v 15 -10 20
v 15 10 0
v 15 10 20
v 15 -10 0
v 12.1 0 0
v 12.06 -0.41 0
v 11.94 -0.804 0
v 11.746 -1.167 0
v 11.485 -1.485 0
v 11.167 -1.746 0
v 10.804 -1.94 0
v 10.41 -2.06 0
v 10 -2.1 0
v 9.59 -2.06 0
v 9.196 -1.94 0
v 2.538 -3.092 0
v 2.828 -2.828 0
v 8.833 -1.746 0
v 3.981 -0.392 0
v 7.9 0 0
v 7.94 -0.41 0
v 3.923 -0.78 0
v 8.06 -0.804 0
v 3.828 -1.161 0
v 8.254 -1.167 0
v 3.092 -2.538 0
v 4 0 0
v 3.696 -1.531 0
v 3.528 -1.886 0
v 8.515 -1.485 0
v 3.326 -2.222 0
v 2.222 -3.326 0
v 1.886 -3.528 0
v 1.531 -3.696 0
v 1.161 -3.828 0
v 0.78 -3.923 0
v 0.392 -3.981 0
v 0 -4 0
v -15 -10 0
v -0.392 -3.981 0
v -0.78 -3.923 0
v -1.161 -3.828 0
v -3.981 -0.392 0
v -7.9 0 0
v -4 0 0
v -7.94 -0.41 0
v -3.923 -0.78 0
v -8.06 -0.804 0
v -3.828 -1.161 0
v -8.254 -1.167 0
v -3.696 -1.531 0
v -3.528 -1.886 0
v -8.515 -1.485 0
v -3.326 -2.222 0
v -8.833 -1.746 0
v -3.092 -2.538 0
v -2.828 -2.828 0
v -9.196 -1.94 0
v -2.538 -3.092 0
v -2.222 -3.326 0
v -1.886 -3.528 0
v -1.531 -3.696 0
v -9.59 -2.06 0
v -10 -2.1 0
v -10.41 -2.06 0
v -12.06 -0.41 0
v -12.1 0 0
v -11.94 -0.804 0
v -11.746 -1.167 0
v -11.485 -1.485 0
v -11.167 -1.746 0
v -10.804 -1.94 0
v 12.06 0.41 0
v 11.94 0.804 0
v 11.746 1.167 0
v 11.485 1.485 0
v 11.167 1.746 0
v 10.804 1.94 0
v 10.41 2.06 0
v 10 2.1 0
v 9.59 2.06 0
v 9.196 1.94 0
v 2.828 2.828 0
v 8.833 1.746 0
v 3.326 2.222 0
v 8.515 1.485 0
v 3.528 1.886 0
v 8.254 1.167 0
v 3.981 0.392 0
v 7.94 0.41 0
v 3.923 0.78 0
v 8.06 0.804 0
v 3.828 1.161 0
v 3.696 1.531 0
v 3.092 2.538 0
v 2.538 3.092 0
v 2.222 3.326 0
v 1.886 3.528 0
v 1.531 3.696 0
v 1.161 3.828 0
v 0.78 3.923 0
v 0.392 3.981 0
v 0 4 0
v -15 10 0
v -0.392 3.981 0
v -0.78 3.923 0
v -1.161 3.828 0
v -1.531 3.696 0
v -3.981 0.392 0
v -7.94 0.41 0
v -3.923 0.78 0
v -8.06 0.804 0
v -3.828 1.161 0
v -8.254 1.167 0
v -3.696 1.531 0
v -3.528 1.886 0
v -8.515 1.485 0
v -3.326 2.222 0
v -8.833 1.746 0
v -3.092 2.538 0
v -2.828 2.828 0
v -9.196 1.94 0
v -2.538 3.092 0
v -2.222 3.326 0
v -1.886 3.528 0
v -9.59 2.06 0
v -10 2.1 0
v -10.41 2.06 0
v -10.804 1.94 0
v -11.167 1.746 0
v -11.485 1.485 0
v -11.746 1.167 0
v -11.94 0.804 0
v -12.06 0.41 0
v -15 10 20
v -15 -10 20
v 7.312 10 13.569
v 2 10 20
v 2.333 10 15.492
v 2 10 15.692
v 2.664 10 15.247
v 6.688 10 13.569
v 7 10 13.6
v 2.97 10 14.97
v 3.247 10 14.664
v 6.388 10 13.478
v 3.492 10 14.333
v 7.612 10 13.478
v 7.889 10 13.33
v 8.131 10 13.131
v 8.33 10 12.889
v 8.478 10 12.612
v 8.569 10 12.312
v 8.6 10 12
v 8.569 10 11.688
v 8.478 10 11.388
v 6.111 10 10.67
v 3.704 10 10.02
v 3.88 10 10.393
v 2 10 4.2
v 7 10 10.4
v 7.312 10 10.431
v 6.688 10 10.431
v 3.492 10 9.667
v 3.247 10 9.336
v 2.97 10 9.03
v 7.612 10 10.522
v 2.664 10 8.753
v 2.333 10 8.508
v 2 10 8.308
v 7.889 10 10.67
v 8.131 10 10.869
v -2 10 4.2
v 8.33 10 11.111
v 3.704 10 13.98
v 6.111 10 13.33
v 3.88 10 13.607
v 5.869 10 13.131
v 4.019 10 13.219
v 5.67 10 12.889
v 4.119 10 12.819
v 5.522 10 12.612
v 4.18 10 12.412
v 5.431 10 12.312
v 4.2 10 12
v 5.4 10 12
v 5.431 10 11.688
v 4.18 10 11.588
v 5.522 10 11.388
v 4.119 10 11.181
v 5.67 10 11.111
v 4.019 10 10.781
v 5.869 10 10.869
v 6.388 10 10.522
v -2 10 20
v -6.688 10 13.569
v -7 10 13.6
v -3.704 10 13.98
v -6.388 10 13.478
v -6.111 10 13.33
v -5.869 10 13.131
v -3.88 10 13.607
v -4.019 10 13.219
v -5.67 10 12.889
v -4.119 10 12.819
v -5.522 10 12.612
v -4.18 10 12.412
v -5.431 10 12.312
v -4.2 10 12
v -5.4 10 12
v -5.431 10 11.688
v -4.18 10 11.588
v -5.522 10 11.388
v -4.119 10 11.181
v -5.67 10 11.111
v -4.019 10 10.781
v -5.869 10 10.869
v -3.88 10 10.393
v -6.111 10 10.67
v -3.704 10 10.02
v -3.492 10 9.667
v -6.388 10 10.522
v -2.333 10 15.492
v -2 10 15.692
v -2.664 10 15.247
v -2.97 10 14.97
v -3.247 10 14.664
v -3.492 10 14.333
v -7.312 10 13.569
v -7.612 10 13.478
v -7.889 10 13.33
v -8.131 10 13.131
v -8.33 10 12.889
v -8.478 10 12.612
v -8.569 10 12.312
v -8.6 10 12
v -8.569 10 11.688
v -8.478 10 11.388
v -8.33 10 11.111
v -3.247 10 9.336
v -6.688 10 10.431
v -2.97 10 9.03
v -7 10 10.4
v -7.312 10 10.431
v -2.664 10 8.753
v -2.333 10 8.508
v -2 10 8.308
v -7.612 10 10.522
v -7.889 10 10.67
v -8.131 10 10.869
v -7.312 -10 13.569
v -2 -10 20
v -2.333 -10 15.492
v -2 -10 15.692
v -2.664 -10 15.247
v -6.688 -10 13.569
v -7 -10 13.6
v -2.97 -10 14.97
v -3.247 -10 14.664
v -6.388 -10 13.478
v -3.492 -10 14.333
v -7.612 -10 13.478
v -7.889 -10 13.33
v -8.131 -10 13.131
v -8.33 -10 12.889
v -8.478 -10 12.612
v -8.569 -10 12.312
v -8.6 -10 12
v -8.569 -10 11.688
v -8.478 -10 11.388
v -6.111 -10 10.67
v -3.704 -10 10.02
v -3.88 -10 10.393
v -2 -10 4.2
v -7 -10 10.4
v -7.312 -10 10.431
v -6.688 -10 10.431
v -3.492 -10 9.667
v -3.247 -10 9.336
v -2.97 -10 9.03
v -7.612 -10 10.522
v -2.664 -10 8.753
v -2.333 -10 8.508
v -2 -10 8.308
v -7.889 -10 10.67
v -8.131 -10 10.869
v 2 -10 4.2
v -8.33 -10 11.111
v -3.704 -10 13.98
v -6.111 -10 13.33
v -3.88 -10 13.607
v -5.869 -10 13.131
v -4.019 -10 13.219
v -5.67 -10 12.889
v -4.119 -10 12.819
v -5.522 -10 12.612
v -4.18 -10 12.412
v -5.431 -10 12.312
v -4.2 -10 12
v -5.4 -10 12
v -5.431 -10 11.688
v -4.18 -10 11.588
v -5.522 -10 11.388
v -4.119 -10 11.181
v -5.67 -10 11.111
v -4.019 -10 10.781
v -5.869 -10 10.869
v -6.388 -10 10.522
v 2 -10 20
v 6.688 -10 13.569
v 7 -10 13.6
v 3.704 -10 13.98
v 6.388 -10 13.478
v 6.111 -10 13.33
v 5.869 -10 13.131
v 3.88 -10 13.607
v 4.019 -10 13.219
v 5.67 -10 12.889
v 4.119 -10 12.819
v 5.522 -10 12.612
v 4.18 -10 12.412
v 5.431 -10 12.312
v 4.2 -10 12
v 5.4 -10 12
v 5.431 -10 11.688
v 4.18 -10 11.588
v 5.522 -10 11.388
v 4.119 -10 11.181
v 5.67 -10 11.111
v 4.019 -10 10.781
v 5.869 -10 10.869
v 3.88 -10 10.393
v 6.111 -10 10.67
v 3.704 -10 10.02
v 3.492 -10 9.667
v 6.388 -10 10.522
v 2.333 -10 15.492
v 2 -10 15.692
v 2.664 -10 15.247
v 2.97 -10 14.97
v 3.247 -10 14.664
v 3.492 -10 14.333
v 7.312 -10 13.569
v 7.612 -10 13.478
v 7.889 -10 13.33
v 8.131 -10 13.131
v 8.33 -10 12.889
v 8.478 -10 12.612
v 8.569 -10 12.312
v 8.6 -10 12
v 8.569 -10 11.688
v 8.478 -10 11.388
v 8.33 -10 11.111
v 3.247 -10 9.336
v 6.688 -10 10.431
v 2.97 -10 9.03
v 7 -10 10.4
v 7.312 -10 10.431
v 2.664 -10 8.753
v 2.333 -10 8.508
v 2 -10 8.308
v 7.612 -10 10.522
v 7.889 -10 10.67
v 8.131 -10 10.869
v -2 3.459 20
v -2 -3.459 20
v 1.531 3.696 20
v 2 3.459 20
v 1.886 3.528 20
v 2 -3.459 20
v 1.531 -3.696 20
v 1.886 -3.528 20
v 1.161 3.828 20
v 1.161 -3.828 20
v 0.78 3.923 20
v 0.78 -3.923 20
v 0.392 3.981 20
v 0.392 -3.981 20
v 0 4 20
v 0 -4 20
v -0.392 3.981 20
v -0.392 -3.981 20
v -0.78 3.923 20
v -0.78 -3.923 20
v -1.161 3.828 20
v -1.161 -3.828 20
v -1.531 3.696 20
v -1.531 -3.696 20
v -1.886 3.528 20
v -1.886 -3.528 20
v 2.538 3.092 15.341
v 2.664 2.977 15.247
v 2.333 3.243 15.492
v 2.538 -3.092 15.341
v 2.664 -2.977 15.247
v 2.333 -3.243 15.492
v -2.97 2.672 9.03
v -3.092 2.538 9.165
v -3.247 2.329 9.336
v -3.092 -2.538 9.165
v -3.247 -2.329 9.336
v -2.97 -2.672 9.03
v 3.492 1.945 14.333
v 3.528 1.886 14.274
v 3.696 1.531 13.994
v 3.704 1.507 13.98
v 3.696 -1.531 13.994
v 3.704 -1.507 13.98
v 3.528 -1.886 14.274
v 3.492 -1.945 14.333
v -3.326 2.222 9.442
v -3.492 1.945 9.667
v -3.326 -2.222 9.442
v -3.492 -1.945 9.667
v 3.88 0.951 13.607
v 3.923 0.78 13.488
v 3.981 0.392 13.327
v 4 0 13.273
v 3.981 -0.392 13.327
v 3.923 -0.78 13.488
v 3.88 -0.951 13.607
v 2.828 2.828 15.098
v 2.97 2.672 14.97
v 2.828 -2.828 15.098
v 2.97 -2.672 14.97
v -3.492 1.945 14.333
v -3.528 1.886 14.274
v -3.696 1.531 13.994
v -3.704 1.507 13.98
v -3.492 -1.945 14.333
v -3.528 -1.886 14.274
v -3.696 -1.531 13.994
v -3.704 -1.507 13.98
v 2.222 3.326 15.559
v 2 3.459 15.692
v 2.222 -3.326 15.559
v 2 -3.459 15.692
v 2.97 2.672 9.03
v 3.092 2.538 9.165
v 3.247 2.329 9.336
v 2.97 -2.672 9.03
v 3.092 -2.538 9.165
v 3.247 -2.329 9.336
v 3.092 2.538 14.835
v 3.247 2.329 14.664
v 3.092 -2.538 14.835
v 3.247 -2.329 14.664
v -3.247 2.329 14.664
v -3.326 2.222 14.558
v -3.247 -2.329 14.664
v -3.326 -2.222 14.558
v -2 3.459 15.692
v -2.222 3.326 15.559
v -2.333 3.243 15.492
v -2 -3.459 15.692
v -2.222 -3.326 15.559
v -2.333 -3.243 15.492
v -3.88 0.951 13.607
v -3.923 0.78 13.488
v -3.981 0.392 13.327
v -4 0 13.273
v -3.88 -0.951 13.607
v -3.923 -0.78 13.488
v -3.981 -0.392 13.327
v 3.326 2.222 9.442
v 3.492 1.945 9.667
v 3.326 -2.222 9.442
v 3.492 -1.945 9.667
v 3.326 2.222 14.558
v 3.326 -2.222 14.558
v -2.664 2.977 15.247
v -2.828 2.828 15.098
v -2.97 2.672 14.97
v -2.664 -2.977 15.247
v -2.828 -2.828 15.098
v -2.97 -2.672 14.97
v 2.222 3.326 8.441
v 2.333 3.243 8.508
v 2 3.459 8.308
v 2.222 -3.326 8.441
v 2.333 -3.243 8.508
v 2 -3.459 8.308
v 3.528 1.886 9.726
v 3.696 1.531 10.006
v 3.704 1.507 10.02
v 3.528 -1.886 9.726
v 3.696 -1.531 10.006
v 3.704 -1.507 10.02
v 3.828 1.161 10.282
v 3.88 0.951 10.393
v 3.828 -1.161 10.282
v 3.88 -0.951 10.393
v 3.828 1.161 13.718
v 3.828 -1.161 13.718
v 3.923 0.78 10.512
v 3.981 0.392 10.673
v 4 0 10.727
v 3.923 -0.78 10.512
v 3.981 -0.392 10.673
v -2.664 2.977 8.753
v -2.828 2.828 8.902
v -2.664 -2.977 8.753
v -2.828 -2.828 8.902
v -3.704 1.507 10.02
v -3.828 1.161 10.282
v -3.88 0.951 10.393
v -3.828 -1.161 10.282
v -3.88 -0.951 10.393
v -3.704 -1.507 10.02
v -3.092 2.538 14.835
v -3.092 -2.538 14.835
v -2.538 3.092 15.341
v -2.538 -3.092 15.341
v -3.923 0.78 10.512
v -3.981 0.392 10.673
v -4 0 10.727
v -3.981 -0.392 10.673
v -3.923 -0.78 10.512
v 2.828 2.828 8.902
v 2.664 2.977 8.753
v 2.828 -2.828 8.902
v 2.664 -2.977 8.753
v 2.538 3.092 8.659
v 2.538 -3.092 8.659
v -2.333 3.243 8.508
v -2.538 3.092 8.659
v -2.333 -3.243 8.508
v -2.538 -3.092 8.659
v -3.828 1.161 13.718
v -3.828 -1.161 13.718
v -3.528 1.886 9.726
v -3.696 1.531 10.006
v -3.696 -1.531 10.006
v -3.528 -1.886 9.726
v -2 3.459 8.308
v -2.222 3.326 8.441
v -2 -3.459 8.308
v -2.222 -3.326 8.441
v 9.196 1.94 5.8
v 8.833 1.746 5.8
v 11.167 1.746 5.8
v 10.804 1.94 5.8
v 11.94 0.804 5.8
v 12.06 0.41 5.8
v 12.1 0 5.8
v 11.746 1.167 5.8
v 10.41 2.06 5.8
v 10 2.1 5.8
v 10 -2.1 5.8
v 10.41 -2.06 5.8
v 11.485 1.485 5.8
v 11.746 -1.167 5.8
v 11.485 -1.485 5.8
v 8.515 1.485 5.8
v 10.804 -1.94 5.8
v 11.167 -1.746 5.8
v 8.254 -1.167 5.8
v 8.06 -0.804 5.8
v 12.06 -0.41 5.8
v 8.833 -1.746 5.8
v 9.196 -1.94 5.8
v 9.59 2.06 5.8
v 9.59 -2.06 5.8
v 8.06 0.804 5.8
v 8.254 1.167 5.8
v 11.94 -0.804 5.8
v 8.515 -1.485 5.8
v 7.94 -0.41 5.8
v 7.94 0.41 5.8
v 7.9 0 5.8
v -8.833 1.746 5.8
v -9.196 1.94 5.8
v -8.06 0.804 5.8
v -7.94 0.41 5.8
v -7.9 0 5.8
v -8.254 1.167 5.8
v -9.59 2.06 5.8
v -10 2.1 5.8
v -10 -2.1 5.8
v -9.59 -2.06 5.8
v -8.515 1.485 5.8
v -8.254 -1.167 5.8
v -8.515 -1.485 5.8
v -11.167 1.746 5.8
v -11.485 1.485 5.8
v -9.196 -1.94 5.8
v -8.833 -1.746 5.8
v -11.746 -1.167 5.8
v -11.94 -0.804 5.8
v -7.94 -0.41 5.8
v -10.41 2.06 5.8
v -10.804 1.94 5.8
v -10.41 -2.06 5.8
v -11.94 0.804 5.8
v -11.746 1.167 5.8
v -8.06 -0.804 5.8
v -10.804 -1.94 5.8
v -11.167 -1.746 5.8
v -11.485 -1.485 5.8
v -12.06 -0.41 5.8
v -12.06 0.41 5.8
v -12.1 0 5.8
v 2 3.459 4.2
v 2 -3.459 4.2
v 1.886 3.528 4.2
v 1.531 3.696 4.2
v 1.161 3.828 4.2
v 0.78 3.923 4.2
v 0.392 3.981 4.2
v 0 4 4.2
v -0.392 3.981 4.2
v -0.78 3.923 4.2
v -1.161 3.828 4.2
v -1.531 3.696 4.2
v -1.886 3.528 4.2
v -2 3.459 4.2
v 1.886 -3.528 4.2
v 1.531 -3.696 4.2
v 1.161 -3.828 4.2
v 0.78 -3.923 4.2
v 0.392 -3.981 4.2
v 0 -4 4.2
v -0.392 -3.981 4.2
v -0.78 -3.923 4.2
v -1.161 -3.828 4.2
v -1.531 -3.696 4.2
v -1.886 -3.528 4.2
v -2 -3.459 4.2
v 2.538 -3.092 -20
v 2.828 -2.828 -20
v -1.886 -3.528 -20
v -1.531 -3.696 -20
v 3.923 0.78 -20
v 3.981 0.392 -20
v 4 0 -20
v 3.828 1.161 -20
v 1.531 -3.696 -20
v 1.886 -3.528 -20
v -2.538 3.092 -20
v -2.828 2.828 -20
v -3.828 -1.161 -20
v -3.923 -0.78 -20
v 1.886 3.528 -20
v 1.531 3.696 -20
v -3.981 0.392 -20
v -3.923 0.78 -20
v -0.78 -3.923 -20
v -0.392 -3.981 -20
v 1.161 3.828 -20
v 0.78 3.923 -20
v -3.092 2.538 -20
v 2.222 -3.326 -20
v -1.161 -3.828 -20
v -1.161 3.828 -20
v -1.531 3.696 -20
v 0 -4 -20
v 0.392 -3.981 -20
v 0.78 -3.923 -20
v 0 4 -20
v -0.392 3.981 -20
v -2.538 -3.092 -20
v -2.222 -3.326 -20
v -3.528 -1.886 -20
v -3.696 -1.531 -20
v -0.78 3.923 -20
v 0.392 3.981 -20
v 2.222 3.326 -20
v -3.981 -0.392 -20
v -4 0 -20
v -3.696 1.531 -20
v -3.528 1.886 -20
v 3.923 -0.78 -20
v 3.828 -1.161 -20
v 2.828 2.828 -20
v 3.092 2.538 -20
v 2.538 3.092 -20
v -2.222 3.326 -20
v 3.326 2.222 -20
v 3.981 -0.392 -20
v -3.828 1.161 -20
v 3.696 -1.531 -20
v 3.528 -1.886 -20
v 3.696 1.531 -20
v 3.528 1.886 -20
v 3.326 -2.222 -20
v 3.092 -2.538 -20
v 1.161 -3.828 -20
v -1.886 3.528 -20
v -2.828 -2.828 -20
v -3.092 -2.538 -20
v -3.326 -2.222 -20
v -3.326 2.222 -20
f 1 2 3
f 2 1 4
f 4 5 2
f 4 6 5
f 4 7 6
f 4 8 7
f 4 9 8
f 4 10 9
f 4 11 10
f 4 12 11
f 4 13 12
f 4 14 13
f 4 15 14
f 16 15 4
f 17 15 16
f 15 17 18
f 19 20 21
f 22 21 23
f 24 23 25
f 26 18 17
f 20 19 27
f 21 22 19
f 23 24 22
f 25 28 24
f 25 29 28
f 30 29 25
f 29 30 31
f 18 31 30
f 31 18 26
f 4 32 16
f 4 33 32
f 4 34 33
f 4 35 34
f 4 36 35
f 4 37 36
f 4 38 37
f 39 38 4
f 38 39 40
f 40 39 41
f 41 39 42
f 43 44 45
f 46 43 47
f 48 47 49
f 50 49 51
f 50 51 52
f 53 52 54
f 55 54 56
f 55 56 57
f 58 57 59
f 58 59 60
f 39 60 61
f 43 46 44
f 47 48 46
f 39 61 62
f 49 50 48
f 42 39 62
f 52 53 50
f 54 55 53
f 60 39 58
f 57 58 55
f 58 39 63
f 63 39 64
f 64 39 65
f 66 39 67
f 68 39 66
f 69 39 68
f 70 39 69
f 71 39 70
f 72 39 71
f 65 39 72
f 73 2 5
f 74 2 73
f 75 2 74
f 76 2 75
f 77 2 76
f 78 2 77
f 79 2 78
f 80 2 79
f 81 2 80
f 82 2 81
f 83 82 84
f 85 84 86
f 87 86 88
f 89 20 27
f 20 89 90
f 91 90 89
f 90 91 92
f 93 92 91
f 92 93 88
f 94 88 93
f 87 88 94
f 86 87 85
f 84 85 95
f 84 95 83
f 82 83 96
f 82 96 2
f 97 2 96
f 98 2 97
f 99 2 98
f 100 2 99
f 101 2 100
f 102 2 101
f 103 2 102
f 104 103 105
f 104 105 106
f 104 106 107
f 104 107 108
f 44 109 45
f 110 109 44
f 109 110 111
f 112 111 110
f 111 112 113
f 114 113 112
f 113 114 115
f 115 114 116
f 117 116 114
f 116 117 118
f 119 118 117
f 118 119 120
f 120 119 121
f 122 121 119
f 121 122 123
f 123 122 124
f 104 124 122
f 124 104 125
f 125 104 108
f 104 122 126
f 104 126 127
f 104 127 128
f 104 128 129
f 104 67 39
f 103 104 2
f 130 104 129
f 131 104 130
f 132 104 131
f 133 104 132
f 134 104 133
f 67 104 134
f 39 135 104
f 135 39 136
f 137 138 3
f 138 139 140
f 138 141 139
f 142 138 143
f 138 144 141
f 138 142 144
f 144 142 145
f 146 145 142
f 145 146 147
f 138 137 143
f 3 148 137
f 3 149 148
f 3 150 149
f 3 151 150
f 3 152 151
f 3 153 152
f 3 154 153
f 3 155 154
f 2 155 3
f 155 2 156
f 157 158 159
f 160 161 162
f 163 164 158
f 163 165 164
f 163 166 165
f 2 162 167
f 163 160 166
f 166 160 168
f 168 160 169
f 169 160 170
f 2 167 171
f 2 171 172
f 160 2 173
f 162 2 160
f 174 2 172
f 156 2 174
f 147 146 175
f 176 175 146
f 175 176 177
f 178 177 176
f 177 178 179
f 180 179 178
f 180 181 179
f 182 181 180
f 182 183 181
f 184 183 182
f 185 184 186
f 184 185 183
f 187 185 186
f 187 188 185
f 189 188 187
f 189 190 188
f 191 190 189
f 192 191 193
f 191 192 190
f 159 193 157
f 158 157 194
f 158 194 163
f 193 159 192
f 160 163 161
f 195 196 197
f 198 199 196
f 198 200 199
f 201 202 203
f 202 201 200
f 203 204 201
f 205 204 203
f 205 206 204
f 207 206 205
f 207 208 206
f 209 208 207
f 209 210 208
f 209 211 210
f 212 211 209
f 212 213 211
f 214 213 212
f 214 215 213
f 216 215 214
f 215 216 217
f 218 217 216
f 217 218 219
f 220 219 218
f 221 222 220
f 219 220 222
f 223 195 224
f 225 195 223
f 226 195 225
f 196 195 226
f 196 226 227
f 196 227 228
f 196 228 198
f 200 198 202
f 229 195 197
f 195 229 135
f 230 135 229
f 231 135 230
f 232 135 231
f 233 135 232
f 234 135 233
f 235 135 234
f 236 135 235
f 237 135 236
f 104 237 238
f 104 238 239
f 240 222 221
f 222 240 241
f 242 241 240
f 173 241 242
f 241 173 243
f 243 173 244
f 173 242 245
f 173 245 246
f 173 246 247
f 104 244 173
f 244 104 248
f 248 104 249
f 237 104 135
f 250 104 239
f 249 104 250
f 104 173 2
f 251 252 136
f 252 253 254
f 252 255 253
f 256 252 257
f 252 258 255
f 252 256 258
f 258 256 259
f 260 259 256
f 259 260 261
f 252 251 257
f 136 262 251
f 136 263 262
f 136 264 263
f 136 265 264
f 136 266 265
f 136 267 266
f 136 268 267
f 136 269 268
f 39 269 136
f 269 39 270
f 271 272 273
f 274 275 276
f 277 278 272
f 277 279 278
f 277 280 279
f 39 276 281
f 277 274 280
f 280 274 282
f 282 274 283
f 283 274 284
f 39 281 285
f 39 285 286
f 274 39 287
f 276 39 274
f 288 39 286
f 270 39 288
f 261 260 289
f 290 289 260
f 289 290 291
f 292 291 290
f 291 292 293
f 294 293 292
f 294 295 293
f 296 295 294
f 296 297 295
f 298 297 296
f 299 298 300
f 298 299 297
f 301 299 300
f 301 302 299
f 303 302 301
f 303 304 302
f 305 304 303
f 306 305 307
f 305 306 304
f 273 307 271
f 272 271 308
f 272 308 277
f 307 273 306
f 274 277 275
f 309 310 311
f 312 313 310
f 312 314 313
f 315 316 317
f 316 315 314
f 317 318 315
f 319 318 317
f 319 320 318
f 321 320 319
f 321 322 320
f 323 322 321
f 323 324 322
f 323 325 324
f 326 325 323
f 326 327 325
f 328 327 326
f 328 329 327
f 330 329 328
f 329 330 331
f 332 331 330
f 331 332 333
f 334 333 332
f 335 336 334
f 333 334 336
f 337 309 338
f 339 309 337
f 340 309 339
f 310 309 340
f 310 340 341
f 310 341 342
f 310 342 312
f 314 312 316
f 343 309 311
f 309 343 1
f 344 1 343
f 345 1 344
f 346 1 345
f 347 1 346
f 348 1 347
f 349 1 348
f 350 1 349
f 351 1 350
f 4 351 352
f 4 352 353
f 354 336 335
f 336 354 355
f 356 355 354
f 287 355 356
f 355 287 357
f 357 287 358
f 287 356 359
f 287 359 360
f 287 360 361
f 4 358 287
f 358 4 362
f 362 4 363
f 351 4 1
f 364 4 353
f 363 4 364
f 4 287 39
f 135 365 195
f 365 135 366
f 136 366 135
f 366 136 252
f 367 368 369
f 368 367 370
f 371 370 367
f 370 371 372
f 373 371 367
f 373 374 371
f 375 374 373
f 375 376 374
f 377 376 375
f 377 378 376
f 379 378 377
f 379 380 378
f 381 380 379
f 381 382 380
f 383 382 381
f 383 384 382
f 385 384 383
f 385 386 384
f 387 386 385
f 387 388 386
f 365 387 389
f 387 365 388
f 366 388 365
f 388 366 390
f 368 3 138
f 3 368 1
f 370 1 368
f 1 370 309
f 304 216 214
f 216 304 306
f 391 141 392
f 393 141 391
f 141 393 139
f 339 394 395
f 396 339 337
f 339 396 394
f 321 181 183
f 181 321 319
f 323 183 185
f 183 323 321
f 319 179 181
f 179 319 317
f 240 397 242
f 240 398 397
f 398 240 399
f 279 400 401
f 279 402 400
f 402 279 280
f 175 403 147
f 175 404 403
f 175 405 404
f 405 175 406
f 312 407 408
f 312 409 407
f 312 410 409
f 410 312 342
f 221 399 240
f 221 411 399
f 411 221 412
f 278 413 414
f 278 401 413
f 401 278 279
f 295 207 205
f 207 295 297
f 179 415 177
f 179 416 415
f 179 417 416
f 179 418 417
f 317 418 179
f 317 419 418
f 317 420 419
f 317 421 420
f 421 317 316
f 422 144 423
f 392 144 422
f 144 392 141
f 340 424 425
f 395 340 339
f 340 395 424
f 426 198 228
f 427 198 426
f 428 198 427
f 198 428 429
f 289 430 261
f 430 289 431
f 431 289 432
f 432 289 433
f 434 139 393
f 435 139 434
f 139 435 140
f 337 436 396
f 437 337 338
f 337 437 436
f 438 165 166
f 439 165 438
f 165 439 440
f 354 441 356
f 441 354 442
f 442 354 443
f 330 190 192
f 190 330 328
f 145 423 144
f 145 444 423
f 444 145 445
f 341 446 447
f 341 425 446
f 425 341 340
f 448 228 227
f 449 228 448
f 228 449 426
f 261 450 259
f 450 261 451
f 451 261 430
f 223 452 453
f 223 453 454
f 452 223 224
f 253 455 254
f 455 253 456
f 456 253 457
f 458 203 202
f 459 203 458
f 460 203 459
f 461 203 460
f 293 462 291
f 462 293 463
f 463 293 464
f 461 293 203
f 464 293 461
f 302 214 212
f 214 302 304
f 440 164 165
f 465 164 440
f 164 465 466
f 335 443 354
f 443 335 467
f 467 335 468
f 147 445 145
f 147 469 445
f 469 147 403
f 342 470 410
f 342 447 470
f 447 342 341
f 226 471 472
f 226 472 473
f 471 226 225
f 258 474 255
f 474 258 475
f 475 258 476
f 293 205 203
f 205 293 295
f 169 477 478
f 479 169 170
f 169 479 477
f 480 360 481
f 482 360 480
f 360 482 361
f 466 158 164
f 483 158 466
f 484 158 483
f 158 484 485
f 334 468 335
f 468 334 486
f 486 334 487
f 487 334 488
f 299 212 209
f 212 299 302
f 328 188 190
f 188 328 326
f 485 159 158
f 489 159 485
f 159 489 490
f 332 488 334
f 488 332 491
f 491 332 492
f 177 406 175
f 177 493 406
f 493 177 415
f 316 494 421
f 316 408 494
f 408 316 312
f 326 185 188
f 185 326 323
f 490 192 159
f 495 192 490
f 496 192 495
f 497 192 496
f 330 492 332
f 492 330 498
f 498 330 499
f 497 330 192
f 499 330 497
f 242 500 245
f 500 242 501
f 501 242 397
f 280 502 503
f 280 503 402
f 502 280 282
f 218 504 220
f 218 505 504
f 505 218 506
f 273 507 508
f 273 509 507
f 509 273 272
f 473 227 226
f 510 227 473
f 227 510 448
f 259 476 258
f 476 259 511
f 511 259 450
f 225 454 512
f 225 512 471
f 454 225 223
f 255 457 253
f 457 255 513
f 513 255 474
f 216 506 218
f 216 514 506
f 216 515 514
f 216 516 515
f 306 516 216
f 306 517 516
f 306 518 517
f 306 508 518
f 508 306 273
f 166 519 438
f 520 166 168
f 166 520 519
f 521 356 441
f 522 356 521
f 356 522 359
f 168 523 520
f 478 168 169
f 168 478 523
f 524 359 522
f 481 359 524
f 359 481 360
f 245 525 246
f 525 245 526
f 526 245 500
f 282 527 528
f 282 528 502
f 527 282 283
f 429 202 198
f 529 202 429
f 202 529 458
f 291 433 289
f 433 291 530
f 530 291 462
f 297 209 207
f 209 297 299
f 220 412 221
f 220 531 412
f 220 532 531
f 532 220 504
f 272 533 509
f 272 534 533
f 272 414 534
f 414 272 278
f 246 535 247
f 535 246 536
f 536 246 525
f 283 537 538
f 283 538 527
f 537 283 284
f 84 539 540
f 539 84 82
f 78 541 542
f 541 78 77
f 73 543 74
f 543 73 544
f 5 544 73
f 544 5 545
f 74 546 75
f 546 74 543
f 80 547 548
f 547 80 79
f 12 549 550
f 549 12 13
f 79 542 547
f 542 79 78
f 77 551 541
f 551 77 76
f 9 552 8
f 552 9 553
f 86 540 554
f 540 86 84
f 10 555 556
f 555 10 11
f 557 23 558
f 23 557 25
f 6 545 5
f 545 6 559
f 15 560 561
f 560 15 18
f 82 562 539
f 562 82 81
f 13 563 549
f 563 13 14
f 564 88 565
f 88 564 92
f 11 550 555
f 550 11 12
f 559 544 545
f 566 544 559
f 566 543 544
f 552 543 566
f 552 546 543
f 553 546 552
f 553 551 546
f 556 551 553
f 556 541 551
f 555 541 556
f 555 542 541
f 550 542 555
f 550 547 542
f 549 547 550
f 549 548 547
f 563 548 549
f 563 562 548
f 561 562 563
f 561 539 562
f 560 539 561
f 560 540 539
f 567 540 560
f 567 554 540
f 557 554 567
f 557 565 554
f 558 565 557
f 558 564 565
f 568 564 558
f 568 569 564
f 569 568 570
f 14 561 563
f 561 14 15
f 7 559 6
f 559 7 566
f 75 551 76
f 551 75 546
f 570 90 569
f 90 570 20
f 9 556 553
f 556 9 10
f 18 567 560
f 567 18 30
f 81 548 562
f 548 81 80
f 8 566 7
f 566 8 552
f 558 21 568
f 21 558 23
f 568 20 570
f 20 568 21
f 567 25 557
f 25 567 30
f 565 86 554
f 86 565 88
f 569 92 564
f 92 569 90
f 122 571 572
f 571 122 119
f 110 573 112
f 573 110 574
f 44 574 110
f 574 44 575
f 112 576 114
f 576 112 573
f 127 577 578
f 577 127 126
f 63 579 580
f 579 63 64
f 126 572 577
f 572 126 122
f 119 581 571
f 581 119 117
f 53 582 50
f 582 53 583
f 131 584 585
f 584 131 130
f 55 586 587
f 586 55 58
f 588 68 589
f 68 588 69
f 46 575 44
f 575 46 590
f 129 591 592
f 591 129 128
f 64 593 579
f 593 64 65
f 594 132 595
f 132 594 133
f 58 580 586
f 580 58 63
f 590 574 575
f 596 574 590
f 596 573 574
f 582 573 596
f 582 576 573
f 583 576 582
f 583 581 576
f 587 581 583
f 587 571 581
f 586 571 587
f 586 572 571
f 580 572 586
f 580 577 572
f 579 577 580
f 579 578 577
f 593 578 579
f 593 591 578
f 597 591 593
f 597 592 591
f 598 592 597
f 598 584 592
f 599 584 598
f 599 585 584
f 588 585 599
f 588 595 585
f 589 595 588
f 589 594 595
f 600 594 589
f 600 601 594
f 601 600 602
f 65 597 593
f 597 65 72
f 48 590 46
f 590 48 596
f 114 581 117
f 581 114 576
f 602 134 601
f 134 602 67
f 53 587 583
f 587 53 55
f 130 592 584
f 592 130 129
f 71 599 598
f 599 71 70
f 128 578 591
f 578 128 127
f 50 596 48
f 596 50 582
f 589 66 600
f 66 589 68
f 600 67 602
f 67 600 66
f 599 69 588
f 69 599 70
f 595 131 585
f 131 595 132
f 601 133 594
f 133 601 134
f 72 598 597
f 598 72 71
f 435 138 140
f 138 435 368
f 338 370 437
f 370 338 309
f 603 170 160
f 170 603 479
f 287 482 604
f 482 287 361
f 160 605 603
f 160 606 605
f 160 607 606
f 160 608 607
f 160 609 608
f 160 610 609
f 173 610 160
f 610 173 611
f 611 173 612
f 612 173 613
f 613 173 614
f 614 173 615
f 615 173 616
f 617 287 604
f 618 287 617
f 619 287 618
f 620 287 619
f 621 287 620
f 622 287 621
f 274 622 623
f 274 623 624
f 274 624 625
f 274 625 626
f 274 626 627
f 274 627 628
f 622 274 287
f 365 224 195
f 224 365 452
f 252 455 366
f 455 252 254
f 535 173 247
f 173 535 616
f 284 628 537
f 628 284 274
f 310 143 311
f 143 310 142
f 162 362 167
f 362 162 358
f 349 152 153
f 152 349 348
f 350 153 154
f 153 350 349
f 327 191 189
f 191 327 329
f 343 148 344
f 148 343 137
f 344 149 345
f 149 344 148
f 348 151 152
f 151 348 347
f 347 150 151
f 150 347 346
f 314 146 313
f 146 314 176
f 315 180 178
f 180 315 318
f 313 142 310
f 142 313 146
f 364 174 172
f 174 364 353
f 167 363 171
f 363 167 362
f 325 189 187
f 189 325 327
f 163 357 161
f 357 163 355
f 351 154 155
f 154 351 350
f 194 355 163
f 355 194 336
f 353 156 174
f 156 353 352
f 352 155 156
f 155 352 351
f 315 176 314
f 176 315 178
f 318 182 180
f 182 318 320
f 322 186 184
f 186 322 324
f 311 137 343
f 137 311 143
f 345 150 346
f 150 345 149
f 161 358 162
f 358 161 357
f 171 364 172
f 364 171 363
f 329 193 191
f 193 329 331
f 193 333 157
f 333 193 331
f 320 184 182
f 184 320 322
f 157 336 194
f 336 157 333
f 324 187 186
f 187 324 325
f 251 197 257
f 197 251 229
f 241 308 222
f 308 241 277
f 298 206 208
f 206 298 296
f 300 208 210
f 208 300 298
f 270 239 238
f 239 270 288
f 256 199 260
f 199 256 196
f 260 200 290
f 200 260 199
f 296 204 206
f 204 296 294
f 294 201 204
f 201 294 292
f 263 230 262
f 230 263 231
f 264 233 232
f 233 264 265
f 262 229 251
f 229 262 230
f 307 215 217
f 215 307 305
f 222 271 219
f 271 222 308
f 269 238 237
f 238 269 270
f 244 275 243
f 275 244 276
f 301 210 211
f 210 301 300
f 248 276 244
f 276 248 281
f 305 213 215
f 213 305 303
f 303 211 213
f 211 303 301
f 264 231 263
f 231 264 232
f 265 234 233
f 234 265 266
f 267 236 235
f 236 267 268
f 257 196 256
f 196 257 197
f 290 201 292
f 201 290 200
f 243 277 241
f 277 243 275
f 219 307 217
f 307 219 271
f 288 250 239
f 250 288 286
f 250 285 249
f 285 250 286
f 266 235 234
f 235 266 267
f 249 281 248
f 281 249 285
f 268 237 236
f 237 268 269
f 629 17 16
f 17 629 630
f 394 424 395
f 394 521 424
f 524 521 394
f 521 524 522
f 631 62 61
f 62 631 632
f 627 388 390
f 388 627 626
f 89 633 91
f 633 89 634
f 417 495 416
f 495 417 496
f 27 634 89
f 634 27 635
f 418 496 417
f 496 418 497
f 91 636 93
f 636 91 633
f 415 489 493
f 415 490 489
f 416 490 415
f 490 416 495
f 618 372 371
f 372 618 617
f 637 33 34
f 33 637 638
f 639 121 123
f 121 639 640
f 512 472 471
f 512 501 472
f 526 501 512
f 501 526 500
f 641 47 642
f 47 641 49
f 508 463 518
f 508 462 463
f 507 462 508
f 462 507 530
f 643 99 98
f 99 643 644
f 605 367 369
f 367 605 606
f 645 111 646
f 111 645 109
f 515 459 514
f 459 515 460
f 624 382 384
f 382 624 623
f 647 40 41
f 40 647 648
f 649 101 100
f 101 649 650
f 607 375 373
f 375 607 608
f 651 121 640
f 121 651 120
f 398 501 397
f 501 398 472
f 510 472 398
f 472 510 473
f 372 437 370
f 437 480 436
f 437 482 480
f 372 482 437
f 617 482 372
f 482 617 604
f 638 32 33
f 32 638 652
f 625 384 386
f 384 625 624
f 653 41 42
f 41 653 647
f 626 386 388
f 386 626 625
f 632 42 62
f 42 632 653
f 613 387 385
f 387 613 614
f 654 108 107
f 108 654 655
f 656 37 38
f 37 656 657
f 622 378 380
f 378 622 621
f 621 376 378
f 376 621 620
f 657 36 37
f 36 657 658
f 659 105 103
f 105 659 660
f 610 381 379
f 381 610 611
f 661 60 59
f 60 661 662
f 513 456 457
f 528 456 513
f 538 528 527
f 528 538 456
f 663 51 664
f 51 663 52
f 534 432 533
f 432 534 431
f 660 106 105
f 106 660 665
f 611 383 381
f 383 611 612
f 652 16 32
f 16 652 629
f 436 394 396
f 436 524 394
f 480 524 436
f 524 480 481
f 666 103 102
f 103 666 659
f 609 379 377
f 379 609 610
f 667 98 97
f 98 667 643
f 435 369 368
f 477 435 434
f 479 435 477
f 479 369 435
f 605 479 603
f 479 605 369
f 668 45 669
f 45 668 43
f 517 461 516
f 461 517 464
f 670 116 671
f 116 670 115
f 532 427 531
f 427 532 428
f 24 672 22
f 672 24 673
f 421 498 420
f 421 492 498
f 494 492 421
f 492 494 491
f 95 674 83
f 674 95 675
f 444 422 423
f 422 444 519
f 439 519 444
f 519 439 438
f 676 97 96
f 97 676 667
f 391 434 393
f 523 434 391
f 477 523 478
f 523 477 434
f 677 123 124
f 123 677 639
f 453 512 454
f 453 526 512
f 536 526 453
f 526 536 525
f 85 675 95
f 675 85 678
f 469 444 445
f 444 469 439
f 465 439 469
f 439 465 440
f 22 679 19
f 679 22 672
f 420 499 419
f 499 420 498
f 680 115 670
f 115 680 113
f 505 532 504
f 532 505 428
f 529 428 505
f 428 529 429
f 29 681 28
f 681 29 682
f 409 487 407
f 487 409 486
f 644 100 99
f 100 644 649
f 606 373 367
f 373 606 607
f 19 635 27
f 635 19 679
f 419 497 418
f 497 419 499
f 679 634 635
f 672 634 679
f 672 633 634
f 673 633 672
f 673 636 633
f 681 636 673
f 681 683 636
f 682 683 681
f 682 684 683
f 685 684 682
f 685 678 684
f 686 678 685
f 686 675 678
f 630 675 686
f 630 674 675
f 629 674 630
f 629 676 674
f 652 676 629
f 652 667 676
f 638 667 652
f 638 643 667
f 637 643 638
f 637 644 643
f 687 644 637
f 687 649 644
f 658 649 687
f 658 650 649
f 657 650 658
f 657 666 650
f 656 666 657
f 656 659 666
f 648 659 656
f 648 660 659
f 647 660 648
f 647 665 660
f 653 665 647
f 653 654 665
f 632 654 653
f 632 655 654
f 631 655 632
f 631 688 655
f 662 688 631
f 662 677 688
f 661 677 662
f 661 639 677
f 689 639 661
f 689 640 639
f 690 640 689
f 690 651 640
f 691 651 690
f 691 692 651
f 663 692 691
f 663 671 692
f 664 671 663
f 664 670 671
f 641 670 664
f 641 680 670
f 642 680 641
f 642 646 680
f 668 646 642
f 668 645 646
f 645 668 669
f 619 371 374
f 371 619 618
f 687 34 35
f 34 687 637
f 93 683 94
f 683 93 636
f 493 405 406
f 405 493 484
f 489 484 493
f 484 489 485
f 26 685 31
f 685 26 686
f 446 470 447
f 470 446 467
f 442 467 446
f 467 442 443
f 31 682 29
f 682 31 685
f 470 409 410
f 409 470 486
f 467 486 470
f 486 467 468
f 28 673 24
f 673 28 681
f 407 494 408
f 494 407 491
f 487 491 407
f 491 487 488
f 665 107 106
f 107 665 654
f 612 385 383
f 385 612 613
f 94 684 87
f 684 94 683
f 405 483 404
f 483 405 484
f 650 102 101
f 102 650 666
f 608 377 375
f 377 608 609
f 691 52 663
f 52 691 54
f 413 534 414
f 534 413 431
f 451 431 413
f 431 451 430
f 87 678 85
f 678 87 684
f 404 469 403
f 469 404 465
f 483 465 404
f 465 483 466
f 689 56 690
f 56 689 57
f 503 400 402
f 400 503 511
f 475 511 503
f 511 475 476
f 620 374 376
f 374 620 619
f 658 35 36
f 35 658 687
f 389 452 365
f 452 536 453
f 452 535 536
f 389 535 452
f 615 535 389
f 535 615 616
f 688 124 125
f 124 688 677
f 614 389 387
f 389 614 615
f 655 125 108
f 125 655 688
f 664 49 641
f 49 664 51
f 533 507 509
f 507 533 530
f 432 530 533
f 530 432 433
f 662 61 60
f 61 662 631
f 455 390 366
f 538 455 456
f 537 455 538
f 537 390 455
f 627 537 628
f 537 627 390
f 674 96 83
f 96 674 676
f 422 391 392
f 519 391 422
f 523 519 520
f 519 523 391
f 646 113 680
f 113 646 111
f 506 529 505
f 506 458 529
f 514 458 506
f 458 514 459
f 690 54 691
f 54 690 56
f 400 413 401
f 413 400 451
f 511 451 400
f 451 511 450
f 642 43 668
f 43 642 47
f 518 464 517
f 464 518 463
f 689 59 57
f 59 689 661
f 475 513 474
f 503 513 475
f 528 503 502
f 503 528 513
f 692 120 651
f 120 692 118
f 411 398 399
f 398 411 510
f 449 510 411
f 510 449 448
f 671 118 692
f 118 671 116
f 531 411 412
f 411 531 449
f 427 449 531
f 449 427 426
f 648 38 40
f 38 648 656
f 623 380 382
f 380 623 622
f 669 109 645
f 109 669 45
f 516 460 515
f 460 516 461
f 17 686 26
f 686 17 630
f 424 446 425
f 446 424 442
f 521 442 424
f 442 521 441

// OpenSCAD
// Parameters
rod_diameter = 8.0; //[4.0:16.0:0.1]
overall_height = 20.0; //[10.0:40.0:0.5]
bracket_width = 30.0; //[15.0:60.0:0.5]
bracket_depth = 20.0; //[10.0:40.0:0.5]
base_thickness = 5.0; //[2.5:10.0:0.25]
rod_center_height_from_base = 12.0; //[6.0:24.0:0.25]
rod_clearance = 0.2; //[0.0:0.6:0.05]
wall_thickness = 4.0; //[2.0:8.0:0.25]
mount_hole_diameter = 4.2; //[3.0:6.0:0.1]
mount_hole_spacing = 20.0; //[10.0:40.0:0.5]
clamp_bolt_diameter = 3.2; //[2.0:5.0:0.1]
clamp_bolt_spacing = 14.0; //[8.0:28.0:0.5]
eps = 0.8; //[0.5:2.0:0.1]
rod_length = 40.0; //[20.0:120.0:1]

// Rod - complete geometry
module rod() {
  color("Silver") {
    cylinder(r=rod_diameter/2, h=rod_length, center=true, $fn=64);
  }
}

// Bracket assembly
module bracket() {
  color("DimGray") {
    // Mounting base
    translate([0, 0, base_thickness/2])
      cube([bracket_width, bracket_depth, base_thickness], center=true);

    // Support body
    translate([0, 0, base_thickness + (overall_height - base_thickness)/2])
      cube([bracket_width, bracket_depth, overall_height - base_thickness], center=true);

    // Clamp bosses
    translate([clamp_bolt_spacing/2, 0, rod_center_height_from_base])
      rotate([90, 0, 0])
      cylinder(r=(clamp_bolt_diameter/2) + wall_thickness, h=bracket_depth, center=true, $fn=64);
    translate([-clamp_bolt_spacing/2, 0, rod_center_height_from_base])
      rotate([90, 0, 0])
      cylinder(r=(clamp_bolt_diameter/2) + wall_thickness, h=bracket_depth, center=true, $fn=64);
  }
}

// Subtract features
module subtract_features() {
  difference() {
    bracket();

    // Rod bore or cradle
    translate([0, 0, rod_center_height_from_base])
      rotate([90, 0, 0])
      cylinder(r=(rod_diameter/2) + rod_clearance, h=bracket_depth + 2*eps, center=true, $fn=64);

    // Mounting holes
    translate([mount_hole_spacing/2, 0, base_thickness/2])
      cylinder(r=mount_hole_diameter/2, h=base_thickness + 2*eps, center=true, $fn=32);
    translate([-mount_hole_spacing/2, 0, base_thickness/2])
      cylinder(r=mount_hole_diameter/2, h=base_thickness + 2*eps, center=true, $fn=32);

    // Clamp split slot
    translate([0, 0, base_thickness + (overall_height - base_thickness)/2])
      cube([wall_thickness, bracket_depth + 2*eps, overall_height - base_thickness + 2*eps], center=true);

    // Clamp bolt holes
    translate([clamp_bolt_spacing/2, 0, rod_center_height_from_base])
      rotate([90, 0, 0])
      cylinder(r=clamp_bolt_diameter/2, h=bracket_depth + 2*eps, center=true, $fn=32);
    translate([-clamp_bolt_spacing/2, 0, rod_center_height_from_base])
      rotate([90, 0, 0])
      cylinder(r=clamp_bolt_diameter/2, h=bracket_depth + 2*eps, center=true, $fn=32);
  }
}

// Assembly
module assembly() {
  union() {
    subtract_features();
    rod();
  }
}

assembly();
